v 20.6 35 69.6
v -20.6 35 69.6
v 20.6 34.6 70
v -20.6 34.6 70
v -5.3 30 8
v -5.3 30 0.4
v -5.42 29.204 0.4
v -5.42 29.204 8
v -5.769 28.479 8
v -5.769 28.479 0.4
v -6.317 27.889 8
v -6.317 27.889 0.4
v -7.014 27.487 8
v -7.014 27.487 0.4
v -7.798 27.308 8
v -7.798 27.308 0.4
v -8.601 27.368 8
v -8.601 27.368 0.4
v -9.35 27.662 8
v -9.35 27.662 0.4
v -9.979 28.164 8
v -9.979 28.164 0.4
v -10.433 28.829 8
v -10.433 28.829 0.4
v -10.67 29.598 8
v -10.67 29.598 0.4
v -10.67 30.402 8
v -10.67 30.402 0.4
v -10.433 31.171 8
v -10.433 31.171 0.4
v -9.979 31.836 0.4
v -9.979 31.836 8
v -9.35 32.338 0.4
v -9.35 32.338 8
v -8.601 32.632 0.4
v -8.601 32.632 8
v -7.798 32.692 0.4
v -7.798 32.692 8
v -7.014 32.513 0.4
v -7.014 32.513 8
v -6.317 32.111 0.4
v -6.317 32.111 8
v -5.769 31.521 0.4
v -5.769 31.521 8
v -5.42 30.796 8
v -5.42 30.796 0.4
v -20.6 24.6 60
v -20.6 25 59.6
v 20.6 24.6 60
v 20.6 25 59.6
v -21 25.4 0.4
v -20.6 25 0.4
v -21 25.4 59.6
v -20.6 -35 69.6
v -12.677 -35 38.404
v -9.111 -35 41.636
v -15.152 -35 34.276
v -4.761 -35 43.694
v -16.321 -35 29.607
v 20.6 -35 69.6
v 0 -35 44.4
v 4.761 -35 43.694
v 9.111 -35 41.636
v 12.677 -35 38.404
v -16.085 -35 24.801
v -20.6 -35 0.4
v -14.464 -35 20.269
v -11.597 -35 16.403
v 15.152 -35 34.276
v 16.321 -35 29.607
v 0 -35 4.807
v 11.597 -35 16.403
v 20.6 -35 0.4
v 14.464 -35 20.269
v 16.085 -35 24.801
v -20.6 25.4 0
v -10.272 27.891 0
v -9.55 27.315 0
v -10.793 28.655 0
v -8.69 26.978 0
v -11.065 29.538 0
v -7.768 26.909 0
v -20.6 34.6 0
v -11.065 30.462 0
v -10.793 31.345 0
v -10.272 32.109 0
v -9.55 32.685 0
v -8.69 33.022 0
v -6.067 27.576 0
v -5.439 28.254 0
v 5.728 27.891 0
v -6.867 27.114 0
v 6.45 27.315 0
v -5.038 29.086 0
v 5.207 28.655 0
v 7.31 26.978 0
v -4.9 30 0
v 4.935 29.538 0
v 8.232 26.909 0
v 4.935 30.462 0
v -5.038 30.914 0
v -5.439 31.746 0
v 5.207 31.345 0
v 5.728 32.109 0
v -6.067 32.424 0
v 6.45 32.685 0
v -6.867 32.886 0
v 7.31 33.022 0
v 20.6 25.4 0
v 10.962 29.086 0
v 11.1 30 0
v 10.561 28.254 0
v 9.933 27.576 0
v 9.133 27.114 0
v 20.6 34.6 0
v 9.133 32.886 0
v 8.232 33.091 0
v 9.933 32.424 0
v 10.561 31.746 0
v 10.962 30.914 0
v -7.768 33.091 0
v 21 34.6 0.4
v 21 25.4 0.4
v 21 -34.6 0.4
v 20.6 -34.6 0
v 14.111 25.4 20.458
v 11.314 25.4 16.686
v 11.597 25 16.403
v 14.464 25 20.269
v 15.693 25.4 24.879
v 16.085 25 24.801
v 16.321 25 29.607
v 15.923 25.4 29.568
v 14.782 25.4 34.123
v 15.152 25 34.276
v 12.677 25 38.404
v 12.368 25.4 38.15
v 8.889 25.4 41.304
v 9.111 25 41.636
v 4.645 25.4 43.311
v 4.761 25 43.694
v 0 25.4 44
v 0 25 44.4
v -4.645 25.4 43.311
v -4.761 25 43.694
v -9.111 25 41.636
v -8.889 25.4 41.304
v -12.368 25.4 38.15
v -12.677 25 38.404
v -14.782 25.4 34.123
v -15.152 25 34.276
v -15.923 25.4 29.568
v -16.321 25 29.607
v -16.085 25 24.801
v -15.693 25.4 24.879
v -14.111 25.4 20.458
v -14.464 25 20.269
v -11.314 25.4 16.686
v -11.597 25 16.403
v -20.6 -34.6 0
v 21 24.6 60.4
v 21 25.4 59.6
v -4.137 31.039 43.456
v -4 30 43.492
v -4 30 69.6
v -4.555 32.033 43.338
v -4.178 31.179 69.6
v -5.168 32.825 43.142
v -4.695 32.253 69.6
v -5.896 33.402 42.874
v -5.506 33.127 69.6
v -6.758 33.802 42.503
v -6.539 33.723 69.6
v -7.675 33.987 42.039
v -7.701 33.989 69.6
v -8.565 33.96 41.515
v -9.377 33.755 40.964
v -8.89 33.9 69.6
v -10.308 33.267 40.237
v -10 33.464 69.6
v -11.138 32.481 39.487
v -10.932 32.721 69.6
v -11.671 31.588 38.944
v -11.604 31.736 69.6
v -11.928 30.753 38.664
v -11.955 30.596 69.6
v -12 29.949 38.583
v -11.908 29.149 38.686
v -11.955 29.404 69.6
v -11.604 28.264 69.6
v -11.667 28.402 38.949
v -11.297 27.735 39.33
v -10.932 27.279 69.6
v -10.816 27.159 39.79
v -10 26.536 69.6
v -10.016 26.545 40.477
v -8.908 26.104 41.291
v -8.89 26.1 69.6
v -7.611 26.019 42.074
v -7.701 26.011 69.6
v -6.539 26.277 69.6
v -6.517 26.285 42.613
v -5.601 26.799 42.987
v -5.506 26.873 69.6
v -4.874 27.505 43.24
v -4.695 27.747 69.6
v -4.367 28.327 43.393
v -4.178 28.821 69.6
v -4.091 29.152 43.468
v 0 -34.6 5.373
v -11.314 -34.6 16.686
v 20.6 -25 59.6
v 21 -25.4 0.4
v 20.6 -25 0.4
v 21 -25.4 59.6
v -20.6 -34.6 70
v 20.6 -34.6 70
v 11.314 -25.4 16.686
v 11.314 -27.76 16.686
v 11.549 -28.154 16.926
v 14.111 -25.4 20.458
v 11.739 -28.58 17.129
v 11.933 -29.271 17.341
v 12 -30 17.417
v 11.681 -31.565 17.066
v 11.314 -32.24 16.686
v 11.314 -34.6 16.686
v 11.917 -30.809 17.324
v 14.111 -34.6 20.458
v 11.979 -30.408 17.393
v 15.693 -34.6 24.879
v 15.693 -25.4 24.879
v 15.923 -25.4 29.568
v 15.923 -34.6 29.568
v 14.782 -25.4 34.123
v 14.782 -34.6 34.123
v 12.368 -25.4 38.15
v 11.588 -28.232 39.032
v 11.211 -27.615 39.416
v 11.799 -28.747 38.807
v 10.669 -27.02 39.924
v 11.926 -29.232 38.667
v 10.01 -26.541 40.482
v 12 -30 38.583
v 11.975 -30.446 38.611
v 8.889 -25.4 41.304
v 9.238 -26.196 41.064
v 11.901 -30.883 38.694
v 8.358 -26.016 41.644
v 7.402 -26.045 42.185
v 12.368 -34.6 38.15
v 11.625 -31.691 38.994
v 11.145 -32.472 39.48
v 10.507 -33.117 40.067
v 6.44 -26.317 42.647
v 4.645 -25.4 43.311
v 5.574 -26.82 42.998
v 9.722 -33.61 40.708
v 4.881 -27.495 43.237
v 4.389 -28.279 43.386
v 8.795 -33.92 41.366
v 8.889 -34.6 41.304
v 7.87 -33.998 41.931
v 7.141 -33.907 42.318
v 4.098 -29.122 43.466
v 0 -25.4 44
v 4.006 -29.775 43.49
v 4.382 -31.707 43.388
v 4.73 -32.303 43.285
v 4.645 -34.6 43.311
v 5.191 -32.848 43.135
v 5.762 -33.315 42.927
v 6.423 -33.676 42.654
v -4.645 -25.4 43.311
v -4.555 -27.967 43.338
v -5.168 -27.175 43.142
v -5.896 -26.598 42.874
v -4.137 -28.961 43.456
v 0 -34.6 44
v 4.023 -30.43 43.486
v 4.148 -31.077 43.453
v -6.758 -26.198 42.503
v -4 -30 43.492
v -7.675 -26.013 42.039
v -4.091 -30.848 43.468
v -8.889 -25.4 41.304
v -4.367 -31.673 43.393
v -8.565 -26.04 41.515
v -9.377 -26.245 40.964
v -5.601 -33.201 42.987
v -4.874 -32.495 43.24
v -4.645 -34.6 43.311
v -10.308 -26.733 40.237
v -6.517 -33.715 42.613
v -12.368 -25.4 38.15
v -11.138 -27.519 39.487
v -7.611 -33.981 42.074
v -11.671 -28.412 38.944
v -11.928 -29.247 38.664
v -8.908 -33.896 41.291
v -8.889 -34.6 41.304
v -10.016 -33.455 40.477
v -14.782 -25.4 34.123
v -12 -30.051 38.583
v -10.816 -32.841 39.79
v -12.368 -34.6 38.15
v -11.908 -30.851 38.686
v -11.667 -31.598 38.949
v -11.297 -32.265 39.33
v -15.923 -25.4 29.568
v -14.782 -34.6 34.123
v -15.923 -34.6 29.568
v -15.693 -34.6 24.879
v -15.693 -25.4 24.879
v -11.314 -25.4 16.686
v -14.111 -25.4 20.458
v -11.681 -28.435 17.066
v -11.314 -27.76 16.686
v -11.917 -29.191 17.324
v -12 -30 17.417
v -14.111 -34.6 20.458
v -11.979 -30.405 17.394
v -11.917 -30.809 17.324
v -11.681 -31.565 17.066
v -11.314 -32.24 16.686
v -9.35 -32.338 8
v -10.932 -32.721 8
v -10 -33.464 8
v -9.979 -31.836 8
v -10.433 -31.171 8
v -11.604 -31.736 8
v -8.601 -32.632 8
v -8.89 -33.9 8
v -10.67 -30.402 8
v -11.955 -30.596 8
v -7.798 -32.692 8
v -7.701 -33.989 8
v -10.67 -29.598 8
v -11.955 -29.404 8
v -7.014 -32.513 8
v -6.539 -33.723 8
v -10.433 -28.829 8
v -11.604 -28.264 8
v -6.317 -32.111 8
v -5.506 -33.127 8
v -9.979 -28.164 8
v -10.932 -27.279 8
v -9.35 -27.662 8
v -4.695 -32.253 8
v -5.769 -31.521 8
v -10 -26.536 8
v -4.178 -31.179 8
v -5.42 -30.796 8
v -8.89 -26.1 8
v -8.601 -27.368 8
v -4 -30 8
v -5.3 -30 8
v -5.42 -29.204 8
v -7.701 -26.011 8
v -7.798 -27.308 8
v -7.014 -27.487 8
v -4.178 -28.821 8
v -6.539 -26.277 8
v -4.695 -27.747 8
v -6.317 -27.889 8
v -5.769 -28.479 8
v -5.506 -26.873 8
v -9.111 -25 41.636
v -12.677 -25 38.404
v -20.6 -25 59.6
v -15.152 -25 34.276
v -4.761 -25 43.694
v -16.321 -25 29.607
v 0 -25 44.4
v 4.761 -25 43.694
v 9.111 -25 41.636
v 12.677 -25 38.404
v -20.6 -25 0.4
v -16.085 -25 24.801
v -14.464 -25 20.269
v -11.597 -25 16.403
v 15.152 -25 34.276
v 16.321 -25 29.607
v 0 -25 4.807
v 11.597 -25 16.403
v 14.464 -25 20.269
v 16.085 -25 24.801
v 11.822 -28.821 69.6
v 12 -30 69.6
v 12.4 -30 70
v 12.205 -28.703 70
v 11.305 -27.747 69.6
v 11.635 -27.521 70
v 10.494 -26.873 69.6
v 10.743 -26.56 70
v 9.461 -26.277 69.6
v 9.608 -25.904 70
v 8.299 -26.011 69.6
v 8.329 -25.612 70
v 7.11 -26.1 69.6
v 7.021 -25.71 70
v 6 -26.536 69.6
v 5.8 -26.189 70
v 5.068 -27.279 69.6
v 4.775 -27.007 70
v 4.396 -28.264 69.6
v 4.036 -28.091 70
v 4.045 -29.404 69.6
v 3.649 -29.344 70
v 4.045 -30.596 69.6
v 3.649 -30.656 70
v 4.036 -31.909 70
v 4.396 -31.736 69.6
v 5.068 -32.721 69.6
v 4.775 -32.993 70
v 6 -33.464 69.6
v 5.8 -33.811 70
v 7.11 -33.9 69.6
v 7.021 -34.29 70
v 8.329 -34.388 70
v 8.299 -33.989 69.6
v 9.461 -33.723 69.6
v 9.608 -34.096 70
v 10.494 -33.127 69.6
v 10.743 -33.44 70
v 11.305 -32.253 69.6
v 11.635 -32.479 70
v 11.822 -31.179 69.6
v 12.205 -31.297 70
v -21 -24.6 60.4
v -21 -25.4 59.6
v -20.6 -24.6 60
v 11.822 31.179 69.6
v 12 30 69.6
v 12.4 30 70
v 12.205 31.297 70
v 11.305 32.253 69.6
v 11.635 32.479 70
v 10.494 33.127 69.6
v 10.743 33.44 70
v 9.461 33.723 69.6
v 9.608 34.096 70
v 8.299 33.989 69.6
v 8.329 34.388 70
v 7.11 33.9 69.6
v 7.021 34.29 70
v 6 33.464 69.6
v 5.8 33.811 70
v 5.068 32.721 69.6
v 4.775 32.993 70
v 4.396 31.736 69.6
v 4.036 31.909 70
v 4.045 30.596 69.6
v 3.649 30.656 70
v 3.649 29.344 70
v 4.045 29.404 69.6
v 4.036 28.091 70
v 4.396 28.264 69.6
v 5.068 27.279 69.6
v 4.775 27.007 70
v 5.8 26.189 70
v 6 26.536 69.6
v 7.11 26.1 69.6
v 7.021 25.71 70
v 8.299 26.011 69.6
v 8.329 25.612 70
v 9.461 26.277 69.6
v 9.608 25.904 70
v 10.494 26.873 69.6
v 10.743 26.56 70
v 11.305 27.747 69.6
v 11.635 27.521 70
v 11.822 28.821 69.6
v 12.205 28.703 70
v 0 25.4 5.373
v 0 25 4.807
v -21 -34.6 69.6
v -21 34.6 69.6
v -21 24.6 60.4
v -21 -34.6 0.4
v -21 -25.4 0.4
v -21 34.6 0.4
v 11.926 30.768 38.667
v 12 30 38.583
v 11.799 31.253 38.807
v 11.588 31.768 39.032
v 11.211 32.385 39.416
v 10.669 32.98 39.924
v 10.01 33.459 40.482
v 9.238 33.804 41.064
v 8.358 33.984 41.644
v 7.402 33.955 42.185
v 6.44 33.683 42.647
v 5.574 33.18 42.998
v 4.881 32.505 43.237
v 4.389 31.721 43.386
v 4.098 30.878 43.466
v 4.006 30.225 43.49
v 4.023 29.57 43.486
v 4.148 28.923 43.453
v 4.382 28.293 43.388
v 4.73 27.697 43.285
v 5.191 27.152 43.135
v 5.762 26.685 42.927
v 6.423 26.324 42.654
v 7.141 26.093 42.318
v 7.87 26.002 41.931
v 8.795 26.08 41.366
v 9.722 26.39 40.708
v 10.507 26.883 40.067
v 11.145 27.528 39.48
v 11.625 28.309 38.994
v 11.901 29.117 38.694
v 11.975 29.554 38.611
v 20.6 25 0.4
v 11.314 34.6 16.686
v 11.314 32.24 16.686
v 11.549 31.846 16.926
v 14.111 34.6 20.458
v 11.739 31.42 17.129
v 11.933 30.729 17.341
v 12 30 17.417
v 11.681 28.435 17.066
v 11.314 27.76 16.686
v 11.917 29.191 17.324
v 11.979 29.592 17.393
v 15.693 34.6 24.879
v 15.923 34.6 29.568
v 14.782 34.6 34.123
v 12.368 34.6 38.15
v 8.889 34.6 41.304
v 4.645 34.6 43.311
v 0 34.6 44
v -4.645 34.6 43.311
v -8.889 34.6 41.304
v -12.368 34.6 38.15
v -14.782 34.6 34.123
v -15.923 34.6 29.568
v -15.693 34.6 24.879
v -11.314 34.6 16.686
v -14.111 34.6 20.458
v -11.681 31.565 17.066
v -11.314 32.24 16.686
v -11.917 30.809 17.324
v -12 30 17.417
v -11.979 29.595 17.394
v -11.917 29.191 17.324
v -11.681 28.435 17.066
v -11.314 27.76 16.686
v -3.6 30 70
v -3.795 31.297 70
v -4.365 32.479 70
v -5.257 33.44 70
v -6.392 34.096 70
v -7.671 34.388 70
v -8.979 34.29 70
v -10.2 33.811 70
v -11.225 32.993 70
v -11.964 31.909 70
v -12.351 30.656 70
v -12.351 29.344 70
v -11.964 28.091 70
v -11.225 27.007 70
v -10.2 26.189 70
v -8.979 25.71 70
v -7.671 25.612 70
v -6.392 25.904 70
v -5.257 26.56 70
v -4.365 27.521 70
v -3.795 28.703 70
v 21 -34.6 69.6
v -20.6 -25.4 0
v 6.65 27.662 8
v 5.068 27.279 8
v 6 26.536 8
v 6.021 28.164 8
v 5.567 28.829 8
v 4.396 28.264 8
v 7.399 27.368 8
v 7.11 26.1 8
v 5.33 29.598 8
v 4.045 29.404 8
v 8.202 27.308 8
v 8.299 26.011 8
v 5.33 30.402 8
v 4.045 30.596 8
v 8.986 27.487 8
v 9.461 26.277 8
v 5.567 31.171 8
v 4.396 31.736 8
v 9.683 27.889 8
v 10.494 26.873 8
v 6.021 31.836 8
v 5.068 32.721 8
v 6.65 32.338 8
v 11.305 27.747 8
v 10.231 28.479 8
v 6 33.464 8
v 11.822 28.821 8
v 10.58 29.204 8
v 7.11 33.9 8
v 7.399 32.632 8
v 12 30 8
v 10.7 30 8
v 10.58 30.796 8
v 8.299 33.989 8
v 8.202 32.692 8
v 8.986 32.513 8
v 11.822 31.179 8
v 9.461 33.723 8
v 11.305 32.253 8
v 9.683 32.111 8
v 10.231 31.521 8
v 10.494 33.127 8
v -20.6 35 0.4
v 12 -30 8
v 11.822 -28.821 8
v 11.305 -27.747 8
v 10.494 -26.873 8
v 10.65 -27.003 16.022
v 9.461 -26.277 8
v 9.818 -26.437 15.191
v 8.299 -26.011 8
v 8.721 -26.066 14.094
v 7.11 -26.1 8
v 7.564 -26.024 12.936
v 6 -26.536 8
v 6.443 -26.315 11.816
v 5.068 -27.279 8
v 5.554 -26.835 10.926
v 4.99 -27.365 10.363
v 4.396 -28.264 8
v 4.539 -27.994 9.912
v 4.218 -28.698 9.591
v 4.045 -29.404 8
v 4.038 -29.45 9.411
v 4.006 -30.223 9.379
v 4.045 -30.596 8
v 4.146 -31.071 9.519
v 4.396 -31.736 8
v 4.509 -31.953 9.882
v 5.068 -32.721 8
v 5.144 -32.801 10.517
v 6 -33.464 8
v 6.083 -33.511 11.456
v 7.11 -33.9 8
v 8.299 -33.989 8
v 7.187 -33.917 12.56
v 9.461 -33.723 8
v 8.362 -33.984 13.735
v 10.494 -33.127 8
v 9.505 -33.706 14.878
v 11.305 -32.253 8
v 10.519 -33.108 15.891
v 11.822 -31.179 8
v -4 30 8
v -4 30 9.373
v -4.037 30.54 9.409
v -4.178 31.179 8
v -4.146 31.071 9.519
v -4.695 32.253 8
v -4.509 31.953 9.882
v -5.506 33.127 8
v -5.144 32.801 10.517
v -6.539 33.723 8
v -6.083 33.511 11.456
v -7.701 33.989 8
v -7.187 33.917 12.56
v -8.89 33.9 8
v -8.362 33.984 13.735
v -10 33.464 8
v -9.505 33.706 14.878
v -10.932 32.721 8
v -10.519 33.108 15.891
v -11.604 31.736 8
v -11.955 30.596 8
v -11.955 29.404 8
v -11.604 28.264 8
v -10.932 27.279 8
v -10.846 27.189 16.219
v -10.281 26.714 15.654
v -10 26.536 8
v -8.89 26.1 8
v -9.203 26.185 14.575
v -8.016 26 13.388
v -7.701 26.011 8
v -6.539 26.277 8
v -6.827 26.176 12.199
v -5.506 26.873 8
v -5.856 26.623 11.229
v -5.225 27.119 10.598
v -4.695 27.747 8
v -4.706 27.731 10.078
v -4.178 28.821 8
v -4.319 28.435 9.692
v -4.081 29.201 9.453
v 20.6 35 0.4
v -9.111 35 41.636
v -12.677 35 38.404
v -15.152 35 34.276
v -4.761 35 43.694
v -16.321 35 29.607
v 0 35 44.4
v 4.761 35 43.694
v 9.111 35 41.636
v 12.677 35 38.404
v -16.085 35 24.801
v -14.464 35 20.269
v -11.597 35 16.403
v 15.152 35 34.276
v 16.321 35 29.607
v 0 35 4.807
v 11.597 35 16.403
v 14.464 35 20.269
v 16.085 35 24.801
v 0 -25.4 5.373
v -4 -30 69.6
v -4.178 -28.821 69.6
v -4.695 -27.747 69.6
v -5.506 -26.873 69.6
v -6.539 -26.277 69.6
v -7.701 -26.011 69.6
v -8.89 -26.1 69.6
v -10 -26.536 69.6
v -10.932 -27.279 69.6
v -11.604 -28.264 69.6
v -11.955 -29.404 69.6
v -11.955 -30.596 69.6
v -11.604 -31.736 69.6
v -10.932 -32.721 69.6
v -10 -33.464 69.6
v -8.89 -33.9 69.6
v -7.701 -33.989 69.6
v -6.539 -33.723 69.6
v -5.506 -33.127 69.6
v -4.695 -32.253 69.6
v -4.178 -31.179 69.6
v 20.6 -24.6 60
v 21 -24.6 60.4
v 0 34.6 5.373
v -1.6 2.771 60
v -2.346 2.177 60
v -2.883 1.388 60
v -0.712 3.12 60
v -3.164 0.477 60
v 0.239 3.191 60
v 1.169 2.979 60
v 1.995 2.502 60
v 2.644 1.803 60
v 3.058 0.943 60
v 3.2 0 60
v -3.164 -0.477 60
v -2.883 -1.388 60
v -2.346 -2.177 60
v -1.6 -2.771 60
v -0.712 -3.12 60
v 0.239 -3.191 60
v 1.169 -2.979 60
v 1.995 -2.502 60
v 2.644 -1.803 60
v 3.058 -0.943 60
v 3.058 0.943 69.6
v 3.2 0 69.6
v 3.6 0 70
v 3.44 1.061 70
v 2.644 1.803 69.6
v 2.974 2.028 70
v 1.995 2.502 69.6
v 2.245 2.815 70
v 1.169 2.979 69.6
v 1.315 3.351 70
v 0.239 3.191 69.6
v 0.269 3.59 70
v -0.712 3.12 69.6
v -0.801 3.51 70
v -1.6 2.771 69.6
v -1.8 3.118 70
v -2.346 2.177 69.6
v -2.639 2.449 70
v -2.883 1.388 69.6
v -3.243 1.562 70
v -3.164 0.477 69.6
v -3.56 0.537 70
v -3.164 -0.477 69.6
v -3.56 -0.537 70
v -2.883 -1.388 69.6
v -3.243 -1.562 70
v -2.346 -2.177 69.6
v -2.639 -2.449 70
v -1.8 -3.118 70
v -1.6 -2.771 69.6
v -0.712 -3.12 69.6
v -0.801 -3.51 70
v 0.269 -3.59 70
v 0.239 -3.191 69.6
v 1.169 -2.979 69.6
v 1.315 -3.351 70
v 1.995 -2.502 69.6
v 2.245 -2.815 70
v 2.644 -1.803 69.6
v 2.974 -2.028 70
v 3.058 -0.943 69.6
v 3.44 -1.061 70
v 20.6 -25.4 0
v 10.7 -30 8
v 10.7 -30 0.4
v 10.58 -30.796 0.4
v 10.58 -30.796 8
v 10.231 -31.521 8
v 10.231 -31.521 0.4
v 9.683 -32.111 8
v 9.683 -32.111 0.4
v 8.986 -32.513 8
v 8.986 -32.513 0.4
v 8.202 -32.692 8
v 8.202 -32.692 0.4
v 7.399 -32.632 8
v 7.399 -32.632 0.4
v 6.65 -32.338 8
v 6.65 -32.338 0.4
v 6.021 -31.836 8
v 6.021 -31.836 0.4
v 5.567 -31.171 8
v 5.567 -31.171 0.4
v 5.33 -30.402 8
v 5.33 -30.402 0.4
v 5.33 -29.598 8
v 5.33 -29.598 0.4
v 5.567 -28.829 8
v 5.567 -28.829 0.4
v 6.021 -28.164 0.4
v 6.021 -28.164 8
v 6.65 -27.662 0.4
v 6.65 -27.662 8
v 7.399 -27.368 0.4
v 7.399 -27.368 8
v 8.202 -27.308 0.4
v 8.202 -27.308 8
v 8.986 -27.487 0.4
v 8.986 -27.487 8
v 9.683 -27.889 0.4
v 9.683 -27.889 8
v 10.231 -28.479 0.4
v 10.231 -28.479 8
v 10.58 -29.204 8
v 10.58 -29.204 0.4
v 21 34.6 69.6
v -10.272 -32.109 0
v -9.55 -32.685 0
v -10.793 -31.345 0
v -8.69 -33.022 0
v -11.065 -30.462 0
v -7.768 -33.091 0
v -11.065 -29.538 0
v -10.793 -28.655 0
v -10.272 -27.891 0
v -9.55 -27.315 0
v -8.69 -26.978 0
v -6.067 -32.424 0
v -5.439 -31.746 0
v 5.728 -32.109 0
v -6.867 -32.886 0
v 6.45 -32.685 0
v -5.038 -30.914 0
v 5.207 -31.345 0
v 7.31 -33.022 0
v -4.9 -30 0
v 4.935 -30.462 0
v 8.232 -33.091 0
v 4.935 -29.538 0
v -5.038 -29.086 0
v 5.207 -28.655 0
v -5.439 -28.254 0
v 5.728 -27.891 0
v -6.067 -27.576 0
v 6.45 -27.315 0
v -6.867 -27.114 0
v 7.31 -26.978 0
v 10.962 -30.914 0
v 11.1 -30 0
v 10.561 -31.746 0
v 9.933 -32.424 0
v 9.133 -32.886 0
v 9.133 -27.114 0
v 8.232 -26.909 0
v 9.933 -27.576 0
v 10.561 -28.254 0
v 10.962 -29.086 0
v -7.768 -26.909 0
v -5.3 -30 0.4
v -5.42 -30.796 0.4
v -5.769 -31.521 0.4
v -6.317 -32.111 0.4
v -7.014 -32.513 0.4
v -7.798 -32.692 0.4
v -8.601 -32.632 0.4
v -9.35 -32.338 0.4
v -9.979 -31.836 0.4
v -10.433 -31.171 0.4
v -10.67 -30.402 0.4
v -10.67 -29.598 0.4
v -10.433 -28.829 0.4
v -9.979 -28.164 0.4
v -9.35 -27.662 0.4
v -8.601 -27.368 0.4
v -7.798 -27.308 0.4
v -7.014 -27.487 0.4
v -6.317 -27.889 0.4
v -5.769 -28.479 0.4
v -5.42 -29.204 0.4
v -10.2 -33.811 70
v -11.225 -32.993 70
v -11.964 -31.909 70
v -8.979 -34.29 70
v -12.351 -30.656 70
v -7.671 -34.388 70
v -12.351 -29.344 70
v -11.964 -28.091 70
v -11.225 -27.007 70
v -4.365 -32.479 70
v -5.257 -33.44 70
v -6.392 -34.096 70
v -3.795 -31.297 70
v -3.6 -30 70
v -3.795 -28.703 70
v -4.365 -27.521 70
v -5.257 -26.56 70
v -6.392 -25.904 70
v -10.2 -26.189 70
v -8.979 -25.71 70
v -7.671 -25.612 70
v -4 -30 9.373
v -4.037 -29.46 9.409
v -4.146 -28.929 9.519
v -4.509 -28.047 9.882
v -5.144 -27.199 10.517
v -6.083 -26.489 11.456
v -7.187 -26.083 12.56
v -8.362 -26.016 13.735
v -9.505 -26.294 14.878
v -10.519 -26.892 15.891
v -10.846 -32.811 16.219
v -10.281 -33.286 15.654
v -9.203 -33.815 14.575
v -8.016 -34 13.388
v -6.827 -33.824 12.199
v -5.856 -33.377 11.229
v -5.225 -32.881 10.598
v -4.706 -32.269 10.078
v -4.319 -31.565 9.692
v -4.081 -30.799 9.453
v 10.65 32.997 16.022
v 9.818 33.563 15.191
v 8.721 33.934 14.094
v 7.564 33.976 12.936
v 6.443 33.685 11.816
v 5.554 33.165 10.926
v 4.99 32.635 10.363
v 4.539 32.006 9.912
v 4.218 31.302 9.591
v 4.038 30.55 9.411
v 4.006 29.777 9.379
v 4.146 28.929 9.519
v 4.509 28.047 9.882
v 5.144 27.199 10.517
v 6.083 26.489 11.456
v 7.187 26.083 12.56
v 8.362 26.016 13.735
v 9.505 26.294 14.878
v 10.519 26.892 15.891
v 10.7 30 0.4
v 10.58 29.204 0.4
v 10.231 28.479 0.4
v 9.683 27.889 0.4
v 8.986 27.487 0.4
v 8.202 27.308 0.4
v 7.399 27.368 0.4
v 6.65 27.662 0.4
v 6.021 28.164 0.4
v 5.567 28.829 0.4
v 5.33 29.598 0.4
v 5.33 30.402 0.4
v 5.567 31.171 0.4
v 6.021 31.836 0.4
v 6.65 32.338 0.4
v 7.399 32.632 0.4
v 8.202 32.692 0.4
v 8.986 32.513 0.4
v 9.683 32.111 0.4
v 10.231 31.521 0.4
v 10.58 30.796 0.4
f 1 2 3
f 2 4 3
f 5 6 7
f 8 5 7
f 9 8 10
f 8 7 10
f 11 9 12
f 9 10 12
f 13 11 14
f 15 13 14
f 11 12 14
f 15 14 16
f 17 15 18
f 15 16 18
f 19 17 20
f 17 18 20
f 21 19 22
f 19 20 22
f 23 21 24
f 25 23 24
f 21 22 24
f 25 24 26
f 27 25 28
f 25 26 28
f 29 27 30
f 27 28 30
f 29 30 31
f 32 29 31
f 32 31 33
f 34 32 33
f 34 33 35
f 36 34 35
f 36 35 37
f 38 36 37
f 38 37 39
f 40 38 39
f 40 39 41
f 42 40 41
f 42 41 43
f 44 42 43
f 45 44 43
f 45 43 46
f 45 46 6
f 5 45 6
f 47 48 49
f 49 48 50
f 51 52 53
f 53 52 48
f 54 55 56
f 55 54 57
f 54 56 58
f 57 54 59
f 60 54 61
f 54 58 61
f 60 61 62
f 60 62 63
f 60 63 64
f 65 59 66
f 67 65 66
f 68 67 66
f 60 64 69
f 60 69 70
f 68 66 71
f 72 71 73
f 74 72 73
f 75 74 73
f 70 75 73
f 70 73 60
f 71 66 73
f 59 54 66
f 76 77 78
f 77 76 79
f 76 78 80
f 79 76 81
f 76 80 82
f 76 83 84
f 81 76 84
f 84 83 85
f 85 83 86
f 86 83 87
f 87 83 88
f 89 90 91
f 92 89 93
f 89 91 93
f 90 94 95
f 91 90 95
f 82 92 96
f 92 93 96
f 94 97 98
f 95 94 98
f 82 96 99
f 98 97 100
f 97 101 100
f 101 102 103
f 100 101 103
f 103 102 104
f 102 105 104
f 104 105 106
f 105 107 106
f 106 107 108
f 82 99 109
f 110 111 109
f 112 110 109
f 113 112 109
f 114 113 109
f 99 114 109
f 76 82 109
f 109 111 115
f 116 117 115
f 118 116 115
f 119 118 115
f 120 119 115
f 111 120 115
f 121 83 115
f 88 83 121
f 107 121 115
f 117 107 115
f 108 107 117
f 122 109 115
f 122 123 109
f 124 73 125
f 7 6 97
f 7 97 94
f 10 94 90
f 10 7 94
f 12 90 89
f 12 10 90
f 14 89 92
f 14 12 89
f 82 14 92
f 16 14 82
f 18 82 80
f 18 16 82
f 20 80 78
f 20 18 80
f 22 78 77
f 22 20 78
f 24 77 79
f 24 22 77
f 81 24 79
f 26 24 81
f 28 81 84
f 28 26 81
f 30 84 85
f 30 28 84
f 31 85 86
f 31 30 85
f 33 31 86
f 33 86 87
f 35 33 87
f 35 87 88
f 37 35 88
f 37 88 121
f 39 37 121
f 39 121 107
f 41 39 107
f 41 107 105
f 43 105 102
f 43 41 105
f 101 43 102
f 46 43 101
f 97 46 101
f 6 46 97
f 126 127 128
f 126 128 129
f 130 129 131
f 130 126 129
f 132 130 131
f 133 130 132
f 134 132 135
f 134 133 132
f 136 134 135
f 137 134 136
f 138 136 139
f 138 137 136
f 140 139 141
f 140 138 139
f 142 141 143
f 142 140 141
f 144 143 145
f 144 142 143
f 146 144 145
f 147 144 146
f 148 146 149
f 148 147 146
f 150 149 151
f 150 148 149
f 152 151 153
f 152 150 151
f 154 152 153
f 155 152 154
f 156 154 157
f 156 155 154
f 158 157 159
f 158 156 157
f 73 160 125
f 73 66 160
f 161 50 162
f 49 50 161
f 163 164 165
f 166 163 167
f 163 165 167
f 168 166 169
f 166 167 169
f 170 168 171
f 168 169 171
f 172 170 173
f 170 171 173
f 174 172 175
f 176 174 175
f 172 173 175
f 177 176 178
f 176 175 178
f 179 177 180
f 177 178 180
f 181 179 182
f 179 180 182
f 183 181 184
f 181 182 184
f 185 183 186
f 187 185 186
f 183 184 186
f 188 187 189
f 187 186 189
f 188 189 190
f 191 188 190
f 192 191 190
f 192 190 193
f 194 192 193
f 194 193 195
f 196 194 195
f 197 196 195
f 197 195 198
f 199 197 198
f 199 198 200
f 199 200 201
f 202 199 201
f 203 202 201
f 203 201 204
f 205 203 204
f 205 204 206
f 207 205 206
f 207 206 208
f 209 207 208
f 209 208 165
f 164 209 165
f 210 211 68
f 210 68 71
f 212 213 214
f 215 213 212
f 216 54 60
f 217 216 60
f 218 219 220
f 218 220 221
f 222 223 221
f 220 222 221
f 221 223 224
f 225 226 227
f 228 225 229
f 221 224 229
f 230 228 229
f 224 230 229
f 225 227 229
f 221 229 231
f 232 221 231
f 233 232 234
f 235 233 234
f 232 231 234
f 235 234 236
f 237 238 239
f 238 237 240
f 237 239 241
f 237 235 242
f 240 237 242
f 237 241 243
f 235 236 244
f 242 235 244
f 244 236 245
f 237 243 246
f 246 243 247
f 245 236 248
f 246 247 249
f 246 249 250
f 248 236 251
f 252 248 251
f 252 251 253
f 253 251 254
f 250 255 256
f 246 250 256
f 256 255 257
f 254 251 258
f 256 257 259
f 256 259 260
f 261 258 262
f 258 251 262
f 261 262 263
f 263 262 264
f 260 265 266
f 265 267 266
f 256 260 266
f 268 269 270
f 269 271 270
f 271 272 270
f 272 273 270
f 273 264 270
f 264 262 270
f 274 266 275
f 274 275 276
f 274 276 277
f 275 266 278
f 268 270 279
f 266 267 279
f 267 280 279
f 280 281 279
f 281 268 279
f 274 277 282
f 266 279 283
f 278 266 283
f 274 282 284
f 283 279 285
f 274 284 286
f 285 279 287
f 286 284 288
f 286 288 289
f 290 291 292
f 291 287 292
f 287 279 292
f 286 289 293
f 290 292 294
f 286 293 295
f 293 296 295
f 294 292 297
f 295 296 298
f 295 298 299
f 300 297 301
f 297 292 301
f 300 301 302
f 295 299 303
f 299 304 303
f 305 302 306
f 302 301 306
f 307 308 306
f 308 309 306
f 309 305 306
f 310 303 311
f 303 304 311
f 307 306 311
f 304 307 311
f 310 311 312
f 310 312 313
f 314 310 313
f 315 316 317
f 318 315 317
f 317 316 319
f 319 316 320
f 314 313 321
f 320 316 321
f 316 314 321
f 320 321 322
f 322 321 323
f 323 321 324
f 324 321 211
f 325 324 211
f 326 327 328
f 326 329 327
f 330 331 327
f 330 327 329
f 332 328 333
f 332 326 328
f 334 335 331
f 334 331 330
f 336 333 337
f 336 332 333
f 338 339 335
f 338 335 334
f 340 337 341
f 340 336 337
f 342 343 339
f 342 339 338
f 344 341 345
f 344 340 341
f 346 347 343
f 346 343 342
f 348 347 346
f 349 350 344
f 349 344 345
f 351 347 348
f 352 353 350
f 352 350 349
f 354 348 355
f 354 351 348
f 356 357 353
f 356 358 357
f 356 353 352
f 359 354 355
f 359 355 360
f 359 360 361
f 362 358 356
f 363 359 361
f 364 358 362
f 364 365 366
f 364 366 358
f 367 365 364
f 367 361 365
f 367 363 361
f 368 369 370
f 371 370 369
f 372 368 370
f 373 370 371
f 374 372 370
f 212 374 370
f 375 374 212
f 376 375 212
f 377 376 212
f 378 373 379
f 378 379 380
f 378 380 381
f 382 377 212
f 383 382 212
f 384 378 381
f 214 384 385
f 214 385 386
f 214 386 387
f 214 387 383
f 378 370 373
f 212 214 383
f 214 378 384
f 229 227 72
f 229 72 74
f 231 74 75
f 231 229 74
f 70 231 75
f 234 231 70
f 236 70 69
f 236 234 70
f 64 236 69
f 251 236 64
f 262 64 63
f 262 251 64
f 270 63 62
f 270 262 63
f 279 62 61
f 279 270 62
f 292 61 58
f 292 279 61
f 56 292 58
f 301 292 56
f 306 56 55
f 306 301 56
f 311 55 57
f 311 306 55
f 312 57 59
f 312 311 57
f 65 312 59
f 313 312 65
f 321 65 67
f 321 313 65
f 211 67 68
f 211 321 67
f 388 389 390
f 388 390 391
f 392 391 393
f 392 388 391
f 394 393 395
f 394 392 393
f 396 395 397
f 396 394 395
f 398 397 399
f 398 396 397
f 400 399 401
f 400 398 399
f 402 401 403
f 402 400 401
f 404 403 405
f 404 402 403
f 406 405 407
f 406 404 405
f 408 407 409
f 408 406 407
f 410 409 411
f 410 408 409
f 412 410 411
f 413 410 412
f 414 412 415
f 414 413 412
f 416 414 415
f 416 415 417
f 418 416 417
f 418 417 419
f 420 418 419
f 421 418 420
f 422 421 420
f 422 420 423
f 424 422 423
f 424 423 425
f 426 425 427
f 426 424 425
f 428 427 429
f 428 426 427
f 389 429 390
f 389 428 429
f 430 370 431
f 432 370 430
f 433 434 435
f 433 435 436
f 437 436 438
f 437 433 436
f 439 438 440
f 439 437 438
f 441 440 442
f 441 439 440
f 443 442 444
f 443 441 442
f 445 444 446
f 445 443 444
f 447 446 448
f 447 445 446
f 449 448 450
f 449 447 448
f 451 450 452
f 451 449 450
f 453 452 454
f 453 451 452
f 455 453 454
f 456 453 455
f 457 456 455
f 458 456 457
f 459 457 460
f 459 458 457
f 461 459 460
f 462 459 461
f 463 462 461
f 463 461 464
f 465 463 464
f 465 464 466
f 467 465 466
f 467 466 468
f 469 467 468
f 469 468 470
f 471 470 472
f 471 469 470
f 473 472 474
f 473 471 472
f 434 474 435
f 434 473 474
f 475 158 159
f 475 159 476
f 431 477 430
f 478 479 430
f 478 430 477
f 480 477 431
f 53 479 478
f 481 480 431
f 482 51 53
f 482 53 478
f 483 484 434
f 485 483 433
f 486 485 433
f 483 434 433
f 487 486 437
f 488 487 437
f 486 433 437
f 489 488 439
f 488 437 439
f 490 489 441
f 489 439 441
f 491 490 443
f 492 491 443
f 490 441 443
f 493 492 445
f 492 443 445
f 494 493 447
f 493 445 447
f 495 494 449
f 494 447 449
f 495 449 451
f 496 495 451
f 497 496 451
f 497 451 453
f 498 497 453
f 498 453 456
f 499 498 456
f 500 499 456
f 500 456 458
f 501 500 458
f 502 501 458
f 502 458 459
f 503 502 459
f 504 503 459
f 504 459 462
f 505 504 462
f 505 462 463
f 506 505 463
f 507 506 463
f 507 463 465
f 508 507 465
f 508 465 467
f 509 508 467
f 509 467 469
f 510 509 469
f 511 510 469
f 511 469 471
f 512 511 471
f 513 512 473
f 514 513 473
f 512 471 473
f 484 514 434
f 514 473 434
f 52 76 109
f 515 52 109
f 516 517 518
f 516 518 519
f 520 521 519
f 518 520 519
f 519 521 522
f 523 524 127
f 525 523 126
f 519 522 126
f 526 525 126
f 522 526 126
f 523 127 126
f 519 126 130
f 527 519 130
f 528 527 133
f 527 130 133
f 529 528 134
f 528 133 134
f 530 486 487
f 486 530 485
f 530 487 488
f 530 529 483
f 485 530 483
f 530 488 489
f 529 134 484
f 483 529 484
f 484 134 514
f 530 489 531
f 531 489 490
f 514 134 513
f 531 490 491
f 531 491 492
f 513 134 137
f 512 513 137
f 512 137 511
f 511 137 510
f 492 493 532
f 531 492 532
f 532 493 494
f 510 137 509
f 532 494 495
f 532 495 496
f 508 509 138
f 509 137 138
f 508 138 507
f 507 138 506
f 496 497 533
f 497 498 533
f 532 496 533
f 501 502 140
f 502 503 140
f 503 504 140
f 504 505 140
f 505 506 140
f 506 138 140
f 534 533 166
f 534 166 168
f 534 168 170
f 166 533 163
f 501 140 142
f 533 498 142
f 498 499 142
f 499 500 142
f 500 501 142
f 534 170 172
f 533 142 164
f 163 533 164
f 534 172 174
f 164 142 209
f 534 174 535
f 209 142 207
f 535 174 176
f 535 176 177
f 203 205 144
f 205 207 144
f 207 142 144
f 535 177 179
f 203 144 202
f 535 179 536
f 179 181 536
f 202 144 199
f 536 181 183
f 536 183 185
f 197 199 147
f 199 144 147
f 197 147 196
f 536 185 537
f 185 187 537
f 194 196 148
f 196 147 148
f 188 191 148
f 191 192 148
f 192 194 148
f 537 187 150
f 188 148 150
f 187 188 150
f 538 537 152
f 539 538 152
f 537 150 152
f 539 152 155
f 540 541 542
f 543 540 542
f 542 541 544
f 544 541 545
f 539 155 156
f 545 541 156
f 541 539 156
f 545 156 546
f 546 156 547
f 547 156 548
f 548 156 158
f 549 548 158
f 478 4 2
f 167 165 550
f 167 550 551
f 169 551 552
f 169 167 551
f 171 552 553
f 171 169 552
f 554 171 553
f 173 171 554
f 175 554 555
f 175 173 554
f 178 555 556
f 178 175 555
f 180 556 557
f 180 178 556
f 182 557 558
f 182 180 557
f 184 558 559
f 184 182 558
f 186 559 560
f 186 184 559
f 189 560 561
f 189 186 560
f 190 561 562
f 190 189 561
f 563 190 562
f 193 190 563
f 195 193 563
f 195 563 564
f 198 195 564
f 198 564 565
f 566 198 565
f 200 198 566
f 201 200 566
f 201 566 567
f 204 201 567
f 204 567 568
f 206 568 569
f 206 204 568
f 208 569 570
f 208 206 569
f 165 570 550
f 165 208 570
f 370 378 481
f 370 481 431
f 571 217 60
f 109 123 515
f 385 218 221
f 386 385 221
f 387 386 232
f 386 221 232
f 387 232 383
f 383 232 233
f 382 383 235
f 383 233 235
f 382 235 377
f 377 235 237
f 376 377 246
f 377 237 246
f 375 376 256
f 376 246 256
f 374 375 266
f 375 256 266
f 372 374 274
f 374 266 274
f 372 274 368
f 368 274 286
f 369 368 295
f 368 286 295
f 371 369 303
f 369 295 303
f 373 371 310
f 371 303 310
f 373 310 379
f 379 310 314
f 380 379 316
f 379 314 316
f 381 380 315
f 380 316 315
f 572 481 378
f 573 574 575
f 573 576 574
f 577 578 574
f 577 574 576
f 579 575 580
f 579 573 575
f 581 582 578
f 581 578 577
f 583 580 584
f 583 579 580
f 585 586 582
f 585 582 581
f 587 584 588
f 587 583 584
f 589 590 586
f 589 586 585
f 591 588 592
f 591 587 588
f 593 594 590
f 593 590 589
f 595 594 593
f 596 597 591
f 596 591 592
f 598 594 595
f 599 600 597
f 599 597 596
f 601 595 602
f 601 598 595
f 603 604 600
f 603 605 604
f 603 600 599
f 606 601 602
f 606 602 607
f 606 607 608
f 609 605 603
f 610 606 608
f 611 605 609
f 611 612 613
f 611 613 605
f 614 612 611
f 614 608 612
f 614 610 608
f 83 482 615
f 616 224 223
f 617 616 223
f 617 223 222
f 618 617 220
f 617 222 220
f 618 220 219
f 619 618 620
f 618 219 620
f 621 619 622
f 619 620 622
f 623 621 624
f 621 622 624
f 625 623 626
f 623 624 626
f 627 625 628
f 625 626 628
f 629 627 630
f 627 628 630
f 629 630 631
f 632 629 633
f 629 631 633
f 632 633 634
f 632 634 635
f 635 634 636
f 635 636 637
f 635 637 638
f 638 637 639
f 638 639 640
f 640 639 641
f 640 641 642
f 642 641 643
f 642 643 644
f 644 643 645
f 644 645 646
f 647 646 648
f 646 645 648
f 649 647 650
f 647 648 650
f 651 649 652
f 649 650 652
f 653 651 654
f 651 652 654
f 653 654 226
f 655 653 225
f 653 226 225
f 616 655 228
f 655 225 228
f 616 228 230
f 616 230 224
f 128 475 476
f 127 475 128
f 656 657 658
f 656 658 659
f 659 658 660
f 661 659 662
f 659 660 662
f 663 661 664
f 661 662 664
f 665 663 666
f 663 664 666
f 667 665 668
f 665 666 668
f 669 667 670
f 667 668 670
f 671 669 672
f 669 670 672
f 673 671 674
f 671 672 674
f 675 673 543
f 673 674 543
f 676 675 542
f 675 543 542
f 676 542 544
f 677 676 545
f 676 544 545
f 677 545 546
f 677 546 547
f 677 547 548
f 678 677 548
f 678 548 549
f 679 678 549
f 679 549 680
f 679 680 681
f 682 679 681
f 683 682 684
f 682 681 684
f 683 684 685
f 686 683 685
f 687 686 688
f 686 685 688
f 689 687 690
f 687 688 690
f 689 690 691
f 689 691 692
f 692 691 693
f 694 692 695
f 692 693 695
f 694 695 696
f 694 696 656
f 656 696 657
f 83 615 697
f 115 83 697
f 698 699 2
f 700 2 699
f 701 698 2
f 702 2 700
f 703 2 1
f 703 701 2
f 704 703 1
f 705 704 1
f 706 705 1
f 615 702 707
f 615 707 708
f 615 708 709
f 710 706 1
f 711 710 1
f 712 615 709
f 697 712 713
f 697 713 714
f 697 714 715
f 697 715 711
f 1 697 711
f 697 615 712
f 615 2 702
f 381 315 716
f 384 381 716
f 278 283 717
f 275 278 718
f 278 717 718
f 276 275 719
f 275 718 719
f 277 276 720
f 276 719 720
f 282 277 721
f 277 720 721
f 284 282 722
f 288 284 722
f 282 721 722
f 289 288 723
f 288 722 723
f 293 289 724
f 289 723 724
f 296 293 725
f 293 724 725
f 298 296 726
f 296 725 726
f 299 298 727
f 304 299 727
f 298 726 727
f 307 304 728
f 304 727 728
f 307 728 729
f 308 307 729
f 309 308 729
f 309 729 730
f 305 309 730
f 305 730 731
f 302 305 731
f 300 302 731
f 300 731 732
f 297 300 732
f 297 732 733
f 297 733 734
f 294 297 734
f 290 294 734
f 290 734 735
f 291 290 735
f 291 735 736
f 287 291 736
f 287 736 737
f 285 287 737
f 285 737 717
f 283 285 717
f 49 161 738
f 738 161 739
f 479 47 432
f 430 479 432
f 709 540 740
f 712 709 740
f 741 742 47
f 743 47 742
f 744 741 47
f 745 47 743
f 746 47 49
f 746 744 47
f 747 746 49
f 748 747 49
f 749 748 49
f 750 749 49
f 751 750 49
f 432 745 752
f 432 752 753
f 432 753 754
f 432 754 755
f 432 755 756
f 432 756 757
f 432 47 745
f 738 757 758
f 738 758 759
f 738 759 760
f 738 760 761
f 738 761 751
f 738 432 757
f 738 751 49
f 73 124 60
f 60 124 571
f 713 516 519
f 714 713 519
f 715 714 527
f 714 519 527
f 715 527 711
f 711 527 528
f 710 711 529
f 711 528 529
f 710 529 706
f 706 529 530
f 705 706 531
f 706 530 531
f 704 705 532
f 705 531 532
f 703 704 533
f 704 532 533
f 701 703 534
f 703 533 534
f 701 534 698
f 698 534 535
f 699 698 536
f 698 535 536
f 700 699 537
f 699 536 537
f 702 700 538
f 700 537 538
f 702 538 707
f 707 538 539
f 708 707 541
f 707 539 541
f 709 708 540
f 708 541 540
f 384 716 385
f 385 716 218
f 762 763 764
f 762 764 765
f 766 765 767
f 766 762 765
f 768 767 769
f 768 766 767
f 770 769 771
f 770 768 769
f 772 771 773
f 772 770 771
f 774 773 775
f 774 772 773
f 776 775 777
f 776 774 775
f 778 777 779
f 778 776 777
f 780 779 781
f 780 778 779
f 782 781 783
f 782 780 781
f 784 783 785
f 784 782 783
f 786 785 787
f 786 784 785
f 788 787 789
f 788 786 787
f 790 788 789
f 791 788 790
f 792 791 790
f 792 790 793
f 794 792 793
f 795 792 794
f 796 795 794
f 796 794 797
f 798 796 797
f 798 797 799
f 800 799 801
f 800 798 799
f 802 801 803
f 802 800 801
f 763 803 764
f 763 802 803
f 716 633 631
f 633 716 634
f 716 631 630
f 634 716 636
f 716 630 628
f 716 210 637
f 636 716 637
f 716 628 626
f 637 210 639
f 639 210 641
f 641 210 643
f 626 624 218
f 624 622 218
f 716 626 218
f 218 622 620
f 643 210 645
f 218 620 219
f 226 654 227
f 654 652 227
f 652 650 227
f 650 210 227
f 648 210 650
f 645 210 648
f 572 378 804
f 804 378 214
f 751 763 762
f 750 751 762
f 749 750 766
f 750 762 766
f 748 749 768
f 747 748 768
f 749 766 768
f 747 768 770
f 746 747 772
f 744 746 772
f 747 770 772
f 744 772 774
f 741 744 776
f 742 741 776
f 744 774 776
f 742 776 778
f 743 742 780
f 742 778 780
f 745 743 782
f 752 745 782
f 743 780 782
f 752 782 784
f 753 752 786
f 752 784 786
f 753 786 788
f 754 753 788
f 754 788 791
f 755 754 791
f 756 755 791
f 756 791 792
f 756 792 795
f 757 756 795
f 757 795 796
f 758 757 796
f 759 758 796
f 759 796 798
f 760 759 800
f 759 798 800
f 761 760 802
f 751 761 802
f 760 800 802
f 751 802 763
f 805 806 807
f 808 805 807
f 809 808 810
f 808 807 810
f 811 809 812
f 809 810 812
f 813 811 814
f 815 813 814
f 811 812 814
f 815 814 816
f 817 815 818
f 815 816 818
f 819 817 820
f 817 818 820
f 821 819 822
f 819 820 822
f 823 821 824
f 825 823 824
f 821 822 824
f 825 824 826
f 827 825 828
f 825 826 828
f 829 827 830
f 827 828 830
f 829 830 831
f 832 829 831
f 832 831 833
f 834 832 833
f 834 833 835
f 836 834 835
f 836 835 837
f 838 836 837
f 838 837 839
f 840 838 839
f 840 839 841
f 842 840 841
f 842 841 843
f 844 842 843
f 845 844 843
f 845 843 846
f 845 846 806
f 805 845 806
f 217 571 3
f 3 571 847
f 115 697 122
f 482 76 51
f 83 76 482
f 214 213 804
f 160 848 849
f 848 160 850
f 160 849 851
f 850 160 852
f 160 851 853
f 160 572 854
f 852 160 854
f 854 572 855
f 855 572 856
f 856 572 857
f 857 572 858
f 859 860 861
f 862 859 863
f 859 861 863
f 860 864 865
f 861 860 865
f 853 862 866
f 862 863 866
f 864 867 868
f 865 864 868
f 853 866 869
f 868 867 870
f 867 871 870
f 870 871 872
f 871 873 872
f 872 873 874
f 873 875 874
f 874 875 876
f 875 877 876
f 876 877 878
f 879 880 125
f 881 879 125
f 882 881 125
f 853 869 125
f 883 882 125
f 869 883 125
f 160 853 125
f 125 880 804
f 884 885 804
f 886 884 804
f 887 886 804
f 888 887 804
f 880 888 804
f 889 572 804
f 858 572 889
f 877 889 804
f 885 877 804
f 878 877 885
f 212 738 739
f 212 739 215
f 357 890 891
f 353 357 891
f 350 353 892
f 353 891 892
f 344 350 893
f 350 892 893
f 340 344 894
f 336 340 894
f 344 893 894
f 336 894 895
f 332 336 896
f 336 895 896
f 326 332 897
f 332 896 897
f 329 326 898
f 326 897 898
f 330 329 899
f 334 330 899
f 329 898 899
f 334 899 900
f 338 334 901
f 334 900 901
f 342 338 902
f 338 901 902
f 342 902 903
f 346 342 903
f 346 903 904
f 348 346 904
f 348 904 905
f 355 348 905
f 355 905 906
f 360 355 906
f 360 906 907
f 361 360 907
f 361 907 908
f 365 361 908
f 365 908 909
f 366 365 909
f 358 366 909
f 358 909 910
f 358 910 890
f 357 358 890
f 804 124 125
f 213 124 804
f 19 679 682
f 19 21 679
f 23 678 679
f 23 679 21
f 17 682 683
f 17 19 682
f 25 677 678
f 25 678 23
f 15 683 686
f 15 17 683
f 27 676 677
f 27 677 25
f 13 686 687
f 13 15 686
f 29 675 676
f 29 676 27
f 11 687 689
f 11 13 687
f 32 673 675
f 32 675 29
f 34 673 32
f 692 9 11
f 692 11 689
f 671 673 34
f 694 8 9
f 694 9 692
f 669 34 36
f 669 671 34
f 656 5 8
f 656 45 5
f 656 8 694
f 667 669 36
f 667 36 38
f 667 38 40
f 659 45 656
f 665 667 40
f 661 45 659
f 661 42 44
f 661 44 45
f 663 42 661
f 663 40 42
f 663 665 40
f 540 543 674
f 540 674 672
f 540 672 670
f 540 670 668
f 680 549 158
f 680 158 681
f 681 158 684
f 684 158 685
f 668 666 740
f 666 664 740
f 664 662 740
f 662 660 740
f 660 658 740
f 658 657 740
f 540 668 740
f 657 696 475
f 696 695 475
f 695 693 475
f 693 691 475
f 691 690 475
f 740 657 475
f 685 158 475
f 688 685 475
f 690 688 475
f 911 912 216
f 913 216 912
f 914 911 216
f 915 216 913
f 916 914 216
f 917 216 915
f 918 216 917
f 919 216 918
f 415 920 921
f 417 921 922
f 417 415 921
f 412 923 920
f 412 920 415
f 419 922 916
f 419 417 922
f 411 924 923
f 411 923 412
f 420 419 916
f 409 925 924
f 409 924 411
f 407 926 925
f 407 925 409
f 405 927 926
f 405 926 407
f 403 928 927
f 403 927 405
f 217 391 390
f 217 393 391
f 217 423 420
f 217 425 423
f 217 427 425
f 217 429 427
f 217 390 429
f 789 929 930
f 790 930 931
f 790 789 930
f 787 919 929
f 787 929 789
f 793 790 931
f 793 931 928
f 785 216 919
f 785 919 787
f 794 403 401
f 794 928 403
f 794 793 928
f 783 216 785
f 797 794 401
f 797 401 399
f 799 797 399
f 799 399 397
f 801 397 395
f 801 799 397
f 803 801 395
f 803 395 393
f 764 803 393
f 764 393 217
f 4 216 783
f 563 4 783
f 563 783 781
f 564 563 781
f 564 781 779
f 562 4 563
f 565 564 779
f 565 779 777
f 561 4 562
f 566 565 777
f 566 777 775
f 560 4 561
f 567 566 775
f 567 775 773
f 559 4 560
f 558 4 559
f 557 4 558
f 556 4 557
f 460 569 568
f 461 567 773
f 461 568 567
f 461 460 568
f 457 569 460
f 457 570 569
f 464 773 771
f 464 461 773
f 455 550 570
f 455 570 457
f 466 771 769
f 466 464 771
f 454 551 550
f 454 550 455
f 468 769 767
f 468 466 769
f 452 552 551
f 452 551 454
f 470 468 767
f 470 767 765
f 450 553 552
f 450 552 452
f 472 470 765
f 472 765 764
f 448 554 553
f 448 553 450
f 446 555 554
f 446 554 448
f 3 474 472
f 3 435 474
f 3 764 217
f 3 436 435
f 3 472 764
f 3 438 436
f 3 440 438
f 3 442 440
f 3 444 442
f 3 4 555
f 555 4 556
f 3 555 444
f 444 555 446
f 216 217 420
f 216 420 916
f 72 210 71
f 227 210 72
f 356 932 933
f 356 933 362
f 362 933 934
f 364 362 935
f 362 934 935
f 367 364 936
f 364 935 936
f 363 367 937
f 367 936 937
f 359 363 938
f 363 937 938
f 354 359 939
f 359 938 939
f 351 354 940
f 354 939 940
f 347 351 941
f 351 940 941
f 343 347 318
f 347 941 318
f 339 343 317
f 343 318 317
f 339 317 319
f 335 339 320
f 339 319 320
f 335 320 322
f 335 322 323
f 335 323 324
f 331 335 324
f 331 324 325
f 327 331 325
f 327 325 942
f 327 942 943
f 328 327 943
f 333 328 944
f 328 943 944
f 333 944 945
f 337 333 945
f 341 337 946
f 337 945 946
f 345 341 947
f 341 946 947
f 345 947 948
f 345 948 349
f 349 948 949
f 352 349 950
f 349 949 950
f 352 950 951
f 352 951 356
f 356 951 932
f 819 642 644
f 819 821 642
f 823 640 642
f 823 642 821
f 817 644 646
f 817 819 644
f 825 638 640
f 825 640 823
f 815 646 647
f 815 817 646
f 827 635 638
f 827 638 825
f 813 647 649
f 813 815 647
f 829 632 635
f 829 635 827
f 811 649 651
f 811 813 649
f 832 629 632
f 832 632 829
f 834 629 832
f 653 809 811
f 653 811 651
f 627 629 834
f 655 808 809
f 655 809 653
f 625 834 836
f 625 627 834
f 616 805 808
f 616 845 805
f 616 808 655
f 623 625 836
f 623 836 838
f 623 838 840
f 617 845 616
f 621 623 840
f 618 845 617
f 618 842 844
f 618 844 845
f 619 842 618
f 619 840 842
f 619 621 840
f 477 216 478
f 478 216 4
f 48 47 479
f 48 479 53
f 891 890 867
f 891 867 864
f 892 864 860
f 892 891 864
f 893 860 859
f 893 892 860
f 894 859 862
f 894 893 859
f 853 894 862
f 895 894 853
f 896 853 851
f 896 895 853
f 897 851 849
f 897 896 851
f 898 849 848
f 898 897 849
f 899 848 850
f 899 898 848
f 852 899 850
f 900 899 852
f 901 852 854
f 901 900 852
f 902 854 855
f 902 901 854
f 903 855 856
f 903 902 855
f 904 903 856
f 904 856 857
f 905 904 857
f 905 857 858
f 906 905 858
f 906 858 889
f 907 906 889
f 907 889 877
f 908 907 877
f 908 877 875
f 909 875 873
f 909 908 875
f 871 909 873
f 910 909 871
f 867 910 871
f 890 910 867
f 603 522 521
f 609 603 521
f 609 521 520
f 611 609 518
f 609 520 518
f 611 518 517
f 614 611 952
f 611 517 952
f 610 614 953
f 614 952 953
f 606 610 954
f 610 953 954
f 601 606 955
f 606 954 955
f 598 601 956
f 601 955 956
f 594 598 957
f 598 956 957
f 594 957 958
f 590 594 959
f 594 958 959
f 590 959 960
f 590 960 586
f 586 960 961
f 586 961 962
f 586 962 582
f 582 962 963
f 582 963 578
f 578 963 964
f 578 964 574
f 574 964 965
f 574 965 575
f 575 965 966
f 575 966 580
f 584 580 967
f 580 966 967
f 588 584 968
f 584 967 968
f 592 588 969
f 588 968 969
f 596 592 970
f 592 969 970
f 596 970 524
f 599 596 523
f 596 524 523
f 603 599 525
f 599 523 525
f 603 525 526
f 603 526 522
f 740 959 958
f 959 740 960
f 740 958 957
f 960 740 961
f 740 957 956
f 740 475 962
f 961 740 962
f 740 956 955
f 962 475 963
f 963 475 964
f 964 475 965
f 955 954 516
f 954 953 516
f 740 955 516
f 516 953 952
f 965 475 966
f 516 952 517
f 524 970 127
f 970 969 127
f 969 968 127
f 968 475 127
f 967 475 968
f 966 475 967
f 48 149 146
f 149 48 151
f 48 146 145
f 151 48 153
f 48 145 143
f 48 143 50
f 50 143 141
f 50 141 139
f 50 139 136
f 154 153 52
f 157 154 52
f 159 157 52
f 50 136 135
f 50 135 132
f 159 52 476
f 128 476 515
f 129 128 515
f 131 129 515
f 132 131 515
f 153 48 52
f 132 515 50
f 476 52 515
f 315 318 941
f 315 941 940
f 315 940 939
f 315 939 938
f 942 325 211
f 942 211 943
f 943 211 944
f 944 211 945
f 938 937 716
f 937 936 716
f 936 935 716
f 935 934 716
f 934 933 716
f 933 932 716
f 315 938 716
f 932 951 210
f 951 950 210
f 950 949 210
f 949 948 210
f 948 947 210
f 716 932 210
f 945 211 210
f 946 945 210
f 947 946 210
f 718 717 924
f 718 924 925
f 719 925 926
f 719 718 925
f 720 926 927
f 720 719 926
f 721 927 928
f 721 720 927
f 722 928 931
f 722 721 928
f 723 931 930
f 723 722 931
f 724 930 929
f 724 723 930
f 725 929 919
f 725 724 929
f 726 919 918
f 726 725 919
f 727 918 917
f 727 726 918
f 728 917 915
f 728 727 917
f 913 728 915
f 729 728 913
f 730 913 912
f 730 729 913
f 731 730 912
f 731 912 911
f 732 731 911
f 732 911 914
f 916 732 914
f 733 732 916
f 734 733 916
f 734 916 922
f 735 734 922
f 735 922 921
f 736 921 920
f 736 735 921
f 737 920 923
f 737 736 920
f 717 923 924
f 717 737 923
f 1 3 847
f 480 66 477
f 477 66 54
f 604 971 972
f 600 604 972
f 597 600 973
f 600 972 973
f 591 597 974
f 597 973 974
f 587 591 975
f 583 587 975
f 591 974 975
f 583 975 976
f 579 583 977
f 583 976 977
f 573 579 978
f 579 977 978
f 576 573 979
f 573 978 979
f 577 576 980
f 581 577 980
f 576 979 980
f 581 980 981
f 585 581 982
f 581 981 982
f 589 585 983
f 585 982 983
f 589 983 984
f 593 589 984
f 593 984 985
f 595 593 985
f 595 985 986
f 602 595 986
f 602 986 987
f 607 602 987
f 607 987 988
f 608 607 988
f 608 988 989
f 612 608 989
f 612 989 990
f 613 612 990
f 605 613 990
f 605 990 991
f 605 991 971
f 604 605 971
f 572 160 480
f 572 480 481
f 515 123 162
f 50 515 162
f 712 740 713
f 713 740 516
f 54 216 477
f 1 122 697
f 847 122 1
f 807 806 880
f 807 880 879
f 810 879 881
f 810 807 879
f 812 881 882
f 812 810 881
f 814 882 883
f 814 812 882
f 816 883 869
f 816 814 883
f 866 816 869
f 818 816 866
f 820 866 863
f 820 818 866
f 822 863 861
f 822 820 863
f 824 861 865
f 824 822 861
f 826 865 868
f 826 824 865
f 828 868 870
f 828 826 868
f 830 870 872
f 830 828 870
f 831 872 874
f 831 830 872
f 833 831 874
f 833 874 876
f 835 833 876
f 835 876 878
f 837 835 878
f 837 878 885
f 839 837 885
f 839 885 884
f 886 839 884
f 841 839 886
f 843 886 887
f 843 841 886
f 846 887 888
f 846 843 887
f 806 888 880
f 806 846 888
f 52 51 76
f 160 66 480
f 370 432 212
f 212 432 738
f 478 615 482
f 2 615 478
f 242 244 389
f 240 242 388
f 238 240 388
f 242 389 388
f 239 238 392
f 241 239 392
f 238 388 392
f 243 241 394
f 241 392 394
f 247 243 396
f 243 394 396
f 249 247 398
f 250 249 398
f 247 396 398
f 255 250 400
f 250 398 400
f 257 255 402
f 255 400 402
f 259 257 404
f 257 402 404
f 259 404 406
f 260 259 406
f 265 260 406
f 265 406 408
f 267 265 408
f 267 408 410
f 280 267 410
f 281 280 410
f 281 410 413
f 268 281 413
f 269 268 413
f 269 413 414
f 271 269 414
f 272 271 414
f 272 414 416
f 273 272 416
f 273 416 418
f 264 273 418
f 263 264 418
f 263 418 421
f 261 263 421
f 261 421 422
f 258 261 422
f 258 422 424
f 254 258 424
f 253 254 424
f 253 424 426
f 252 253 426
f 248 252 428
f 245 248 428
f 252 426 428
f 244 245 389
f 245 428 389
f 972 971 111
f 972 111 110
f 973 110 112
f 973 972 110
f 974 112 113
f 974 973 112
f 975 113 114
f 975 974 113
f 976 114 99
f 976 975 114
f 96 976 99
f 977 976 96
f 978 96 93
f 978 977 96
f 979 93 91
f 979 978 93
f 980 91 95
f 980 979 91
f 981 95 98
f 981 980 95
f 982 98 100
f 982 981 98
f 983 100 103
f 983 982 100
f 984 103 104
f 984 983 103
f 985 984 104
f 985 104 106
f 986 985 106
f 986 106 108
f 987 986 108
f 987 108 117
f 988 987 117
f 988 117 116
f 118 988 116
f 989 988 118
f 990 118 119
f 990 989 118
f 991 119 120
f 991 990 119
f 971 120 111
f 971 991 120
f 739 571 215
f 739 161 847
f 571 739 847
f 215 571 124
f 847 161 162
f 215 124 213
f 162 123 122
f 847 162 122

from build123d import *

# Parameters (mm, degrees)
SKETCH001_W     = 42
SKETCH001_H     = 70
PAD001_DEPTH    = 70
POCKET_DEPTH    = 70
SKETCH003_W     = 42
SKETCH003_H     = 50
POCKET001_DEPTH = 60
SKETCH004_R     = 3.2
POCKET002_DEPTH = 10
SKETCH005_R     = 2.7
POCKET003_DEPTH = 70
SKETCH007_R     = 4
POCKET004_DEPTH = 62
CHAMFER001_SIZE = 0.4


with BuildPart() as part:
    # Sketch001 → Pad001 (new body)
    with BuildSketch(Plane.XY):
        Rectangle(SKETCH001_W, SKETCH001_H)
    extrude(amount=PAD001_DEPTH)

    # Sketch002 (on Face3 of Pad001) → Pocket (cut)
    with BuildSketch(Plane.XZ.offset(35)):
        with BuildLine():
            ThreePointArc((11.313708, 16.686292), (0, 44), (-11.313708, 16.686292))
            Line((-11.313708, 16.686292), (0, 5.372583))
            Line((0, 5.372583), (11.313708, 16.686292))
        make_face()
    extrude(amount=-POCKET_DEPTH, mode=Mode.SUBTRACT)

    # Sketch003 (on Face3 of Pocket) → Pocket001 (cut)
    with BuildSketch(Plane(origin=(0, 0, 0), x_dir=(1, 0, 0), z_dir=(0, 0, -1))):
        Rectangle(SKETCH003_W, SKETCH003_H)
    extrude(amount=-POCKET001_DEPTH, mode=Mode.SUBTRACT)

    # Sketch004 (on Face4 of Pocket001) → Pocket002 (cut)
    with BuildSketch(Plane.XY.offset(70)):
        Circle(SKETCH004_R)
    extrude(amount=-POCKET002_DEPTH, mode=Mode.SUBTRACT)

    # Sketch005 (on Face9 of Pocket001) → Pocket003 (cut)
    with BuildSketch(Plane(origin=(0, 0, 0), x_dir=(1, 0, 0), z_dir=(0, 0, -1))):
        with Locations((-8, 30)):
            Circle(SKETCH005_R)
        with Locations((8, 30)):
            Circle(SKETCH005_R)
        with Locations((-8, -30)):
            Circle(SKETCH005_R)
        with Locations((8, -30)):
            Circle(SKETCH005_R)
    extrude(amount=-POCKET003_DEPTH, mode=Mode.SUBTRACT)

    # Sketch007 (on Face4 of Pocket003) → Pocket004 (cut)
    with BuildSketch(Plane.XY.offset(70)):
        with Locations((-8, 30)):
            Circle(SKETCH007_R)
        with Locations((8, 30)):
            Circle(SKETCH007_R)
        with Locations((8, -30)):
            Circle(SKETCH007_R)
        with Locations((-8, -30)):
            Circle(SKETCH007_R)
    extrude(amount=-POCKET004_DEPTH, mode=Mode.SUBTRACT)

    # Chamfer001
    chamfer001_edges = [part.edges().sort_by_distance(p)[0] for p in [
        (0, 35, 70),
        (-21, 0, 70),
        (21, 0, 70),
        (0, -35, 70),
        (-12, -30, 70),
        (4, -30, 70),
        (-12, 30, 70),
        (-3.2, 0, 70),
        (4, 30, 70),
        (21, -35, 35),
        (0, -35, 0),
        (-21, -35, 35),
        (0, -35, 44),
        (-5.656854, -35, 11.029437),
        (5.656854, -35, 11.029437),
        (-21, -30, 0),
        (-21, -25, 30),
        (-21, 0, 60),
        (-21, 25, 30),
        (-21, 30, 0),
        (-21, 35, 35),
        (0, 35, 0),
        (21, 35, 35),
        (5.656854, 35, 11.029437),
        (-5.656854, 35, 11.029437),
        (0, 35, 44),
        (21, 30, 0),
        (21, 25, 30),
        (21, 0, 60),
        (21, -25, 30),
        (21, -30, 0),
        (0, -25, 0),
        (0, -25, 60),
        (-5.656854, -25, 11.029437),
        (0, -25, 44),
        (5.656854, -25, 11.029437),
        (0, 25, 0),
        (0, 25, 60),
        (0, 25, 44),
        (-5.656854, 25, 11.029437),
        (5.656854, 25, 11.029437),
        (5.3, -30, 0),
        (-10.7, -30, 0),
        (-10.7, 30, 0),
        (5.3, 30, 0),
    ]]
    chamfer(chamfer001_edges, length=CHAMFER001_SIZE)


solid = part.part
